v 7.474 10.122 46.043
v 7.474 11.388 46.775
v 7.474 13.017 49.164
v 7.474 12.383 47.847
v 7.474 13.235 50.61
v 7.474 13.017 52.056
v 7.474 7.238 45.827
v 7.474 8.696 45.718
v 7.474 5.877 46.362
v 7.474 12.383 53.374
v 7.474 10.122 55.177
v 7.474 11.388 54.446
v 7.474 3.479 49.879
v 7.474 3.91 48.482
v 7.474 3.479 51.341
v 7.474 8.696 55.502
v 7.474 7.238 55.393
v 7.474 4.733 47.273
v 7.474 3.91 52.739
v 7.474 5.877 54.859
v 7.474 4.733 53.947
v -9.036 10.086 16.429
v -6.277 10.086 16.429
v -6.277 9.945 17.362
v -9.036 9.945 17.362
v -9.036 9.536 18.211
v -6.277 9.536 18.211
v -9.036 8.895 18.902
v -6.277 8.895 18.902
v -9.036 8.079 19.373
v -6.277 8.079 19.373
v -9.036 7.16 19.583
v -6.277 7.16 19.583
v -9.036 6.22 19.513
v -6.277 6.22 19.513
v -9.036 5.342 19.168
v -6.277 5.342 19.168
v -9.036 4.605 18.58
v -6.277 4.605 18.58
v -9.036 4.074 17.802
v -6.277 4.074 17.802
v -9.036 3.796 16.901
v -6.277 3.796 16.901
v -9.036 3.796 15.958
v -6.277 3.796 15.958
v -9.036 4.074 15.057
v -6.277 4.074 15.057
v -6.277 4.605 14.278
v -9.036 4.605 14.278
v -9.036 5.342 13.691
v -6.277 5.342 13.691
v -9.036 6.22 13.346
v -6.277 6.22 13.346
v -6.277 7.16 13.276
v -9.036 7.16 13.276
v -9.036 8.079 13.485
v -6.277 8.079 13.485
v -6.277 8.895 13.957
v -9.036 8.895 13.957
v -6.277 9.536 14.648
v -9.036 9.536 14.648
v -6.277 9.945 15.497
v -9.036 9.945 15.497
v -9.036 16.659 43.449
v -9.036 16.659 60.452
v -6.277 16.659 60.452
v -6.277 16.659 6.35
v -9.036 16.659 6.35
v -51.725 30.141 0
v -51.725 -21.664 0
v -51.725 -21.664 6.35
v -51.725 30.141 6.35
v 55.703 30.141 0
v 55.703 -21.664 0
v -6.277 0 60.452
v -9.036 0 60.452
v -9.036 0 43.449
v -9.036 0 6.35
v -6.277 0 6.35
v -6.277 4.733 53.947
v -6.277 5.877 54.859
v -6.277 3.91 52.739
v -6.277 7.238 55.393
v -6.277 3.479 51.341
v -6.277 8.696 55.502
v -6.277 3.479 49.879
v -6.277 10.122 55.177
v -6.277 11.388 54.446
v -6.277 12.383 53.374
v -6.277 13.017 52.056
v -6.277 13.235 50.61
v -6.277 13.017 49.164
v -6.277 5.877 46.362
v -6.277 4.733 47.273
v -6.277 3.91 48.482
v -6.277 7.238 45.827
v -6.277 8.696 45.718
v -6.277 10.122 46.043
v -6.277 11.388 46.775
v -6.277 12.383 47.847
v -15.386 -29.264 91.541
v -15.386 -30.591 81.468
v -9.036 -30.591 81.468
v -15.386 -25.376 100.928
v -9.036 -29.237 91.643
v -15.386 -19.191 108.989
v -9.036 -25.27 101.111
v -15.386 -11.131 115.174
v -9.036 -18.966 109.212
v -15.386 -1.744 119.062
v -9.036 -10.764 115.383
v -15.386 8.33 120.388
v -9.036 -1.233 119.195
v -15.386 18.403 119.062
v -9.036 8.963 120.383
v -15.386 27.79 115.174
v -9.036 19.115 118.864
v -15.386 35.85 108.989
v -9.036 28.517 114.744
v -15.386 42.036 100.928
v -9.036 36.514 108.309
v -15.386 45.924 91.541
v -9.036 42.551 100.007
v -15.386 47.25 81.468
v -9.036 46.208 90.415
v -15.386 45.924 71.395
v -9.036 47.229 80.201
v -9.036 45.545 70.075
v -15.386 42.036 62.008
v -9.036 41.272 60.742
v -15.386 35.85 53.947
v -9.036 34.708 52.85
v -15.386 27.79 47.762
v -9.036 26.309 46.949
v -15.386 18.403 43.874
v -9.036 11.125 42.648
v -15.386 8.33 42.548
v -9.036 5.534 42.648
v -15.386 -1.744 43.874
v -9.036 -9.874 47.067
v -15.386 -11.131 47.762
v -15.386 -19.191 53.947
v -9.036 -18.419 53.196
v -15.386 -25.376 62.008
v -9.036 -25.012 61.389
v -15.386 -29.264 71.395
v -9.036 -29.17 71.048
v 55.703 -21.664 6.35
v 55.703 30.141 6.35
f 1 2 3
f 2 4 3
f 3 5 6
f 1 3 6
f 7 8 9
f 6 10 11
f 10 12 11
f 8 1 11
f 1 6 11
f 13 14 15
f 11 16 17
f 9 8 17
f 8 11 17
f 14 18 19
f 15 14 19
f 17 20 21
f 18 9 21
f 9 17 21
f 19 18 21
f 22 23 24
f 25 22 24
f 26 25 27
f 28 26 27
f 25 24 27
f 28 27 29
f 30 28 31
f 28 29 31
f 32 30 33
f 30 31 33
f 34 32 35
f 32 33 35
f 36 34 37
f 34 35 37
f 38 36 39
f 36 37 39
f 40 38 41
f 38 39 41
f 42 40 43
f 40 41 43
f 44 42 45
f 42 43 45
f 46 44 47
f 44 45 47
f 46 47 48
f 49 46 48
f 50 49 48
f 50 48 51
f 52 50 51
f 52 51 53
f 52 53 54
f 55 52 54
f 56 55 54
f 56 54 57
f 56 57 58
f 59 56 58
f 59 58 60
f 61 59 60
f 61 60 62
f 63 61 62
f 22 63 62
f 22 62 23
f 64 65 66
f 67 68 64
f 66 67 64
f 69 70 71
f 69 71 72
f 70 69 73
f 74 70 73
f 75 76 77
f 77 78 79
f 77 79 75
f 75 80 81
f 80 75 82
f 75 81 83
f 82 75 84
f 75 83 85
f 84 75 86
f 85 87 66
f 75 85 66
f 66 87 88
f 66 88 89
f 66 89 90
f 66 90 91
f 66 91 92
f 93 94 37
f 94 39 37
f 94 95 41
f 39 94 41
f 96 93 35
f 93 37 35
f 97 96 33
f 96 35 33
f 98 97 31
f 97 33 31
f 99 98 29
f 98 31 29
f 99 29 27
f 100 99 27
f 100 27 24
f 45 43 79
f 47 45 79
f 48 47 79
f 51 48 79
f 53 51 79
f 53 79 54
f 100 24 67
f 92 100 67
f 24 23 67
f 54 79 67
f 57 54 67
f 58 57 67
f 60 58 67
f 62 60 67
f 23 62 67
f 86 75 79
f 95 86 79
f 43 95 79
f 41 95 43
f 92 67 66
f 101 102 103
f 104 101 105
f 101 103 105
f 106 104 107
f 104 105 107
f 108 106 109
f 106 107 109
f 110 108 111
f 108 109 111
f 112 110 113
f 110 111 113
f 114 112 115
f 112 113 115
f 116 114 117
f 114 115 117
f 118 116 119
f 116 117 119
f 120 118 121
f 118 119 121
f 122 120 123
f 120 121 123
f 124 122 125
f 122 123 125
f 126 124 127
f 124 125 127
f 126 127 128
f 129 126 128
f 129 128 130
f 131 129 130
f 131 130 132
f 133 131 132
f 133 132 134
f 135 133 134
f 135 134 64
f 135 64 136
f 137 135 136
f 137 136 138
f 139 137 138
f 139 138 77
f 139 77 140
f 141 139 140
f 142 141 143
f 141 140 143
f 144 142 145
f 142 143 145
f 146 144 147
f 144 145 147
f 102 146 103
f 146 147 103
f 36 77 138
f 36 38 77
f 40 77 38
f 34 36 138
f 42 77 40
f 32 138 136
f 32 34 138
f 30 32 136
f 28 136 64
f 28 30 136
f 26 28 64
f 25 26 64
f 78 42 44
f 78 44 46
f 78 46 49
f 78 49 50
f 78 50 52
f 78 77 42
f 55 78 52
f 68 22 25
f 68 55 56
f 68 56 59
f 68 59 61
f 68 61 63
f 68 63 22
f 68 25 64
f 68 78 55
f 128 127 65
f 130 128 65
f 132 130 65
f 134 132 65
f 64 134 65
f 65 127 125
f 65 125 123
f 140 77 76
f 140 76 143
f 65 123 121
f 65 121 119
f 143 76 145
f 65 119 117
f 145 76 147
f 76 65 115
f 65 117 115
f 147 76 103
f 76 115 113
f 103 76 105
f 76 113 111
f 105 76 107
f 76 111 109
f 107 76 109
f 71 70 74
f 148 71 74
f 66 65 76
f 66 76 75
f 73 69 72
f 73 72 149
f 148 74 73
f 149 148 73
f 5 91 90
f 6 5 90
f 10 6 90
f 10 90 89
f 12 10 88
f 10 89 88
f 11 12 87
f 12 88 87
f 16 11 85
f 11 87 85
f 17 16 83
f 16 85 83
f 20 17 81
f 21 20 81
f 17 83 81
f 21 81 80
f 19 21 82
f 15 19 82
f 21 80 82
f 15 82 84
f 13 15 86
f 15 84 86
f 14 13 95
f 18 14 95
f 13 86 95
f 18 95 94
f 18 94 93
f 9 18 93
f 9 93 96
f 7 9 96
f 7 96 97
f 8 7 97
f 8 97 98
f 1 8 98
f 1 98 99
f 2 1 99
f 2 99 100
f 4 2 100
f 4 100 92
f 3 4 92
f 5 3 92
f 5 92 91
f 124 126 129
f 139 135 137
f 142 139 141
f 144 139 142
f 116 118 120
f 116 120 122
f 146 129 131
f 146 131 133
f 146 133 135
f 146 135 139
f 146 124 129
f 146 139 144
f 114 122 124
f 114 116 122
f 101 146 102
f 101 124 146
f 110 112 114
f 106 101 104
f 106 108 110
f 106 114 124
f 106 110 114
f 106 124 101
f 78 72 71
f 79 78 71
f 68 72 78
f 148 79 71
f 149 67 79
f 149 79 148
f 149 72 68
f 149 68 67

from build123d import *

# Parameters (mm, degrees)
F0_W      = 107.4284315109
F0_H      = 51.8054459244
F1_DEPTH  = 6.35
F2_W      = 2.7584051713
F2_H      = 16.6592616588
F3_DEPTH  = 54.102
F4_R      = 4.9057005628
F5_DEPTH  = 45.4490629414
F6_R      = 38.9203036593
F7_DEPTH  = 6.35
F8_DEPTH  = 16.51
F9_R      = 3.1625742778
F10_DEPTH = 45.4490629414


with BuildPart() as f1:
    # F0 (on Top) → F1 (new body)
    with BuildSketch(Plane.XY):
        with Locations((1.9887797534, 4.2384741828)):
            Rectangle(F0_W, F0_H)
    extrude(amount=F1_DEPTH)

    # F2 (on face) → F3 (join)
    with BuildSketch(Plane.XY.offset(6.35)):
        with Locations((-7.6565756463, 8.3296308294)):
            Rectangle(F2_W, F2_H)
    extrude(amount=F3_DEPTH)

    # F4 (on face) → F5 (cut, through all)
    with BuildSketch(Plane.YZ.offset(-6.2773730606)):
        with Locations((8.3296308294, 50.6100766361)):
            Circle(F4_R)
    extrude(amount=-F5_DEPTH, mode=Mode.SUBTRACT)

    # F6 (on face) → F7 (join)
    with BuildSketch(Plane(origin=(-9.0357782319, 0, 0), x_dir=(0, -1, 0), z_dir=(-1, 0, 0))):
        with Locations((-8.3296308294, 81.4679414034)):
            Circle(F6_R)
    extrude(amount=F7_DEPTH)

    # F8 (add): a face of the model
    f8_faces = [f1.faces().sort_by_distance(p)[0] for p in [
        (-9.0357782319, 8.3296308294, 50.6100766361),
    ]]
    extrude(f8_faces, amount=F8_DEPTH)

    # F9 (on face) → F10 (cut, through all)
    with BuildSketch(Plane.YZ.offset(-6.2773730606)):
        with Locations((6.9233309478, 16.4294000715)):
            Circle(F9_R)
    extrude(amount=-F10_DEPTH, mode=Mode.SUBTRACT)


solid = f1.part
